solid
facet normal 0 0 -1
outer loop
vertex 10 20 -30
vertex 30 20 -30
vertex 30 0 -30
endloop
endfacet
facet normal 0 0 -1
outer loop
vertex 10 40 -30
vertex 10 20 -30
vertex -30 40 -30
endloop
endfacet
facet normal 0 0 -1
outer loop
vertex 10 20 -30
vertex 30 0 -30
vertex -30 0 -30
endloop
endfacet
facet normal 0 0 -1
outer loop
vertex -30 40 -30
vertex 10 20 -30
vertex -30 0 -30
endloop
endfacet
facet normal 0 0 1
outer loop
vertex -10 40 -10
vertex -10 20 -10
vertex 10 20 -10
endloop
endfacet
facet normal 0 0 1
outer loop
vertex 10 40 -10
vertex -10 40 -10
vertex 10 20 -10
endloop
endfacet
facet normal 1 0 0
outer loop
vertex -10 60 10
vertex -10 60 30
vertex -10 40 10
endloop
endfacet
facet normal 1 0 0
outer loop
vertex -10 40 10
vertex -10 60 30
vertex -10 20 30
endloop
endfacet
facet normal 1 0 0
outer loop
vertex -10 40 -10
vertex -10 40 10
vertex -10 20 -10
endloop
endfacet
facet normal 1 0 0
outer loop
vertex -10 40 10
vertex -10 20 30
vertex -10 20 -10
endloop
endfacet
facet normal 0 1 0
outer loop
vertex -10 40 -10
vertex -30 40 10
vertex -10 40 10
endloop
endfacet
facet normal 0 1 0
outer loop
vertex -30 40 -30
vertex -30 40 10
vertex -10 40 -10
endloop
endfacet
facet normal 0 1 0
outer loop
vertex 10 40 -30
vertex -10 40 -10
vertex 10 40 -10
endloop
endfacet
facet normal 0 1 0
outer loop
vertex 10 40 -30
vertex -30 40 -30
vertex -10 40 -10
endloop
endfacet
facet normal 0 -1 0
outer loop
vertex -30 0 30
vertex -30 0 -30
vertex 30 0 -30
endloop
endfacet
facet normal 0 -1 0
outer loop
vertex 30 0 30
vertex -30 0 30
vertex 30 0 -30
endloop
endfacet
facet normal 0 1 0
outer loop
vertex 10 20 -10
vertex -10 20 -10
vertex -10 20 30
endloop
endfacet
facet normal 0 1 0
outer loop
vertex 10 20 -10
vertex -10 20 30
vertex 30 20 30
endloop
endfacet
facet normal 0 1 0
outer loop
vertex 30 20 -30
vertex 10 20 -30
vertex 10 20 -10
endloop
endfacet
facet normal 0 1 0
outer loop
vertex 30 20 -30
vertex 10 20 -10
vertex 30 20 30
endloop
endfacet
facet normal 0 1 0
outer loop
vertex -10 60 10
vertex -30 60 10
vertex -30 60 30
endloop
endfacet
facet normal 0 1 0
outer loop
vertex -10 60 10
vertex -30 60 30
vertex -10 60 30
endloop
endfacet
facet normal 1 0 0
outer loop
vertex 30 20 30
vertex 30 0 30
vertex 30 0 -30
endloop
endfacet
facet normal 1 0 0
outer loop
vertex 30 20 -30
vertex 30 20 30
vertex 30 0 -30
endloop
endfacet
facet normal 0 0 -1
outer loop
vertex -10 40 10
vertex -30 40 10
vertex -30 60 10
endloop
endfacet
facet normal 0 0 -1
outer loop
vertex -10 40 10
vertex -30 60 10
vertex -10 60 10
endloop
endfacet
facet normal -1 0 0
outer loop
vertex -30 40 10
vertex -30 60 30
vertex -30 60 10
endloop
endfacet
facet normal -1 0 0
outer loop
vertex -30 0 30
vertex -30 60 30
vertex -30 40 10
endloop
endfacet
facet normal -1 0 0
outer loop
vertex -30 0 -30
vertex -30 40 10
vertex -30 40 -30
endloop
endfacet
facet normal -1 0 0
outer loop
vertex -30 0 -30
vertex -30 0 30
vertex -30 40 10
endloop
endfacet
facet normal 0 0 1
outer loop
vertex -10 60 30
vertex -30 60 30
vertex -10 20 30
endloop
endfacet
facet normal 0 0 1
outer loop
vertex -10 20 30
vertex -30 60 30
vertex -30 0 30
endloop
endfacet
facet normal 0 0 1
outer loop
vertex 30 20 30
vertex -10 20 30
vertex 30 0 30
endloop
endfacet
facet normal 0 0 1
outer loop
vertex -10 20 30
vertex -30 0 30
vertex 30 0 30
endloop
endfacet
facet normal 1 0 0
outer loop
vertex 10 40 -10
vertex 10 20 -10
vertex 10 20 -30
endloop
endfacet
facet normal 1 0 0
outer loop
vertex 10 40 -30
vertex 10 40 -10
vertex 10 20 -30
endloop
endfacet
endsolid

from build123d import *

# Parameters (mm, degrees)
CROQUIS1_W              = 60
CROQUIS1_H              = 60
SALIENTE_EXTRUIR1_DEPTH = 20
SALIENTE_EXTRUIR2_DEPTH = 20
CROQUIS3_W              = 20
CROQUIS3_H              = 20
SALIENTE_EXTRUIR3_DEPTH = 20


with BuildPart() as part:
    # Croquis1 → Saliente-Extruir1 (new body)
    with BuildSketch(Plane(origin=(0, 0, 0), x_dir=(1, 0, 0), z_dir=(0, 1, 0))):
        Rectangle(CROQUIS1_W, CROQUIS1_H)
    extrude(amount=SALIENTE_EXTRUIR1_DEPTH)

    # Croquis2 → Saliente-Extruir2 (add)
    with BuildSketch(Plane(origin=(0, 20, 0), x_dir=(1, 0, 0), z_dir=(0, 1, 0))):
        Polygon((-30, -30), (-10, -30), (-10, 10), (10, 10), (10, 30), (-30, 30), align=None)
    extrude(amount=SALIENTE_EXTRUIR2_DEPTH)

    # Croquis3 → Saliente-Extruir3 (add)
    with BuildSketch(Plane(origin=(0, 40, 0), x_dir=(1, 0, 0), z_dir=(0, 1, 0))):
        with Locations((-20, -20)):
            Rectangle(CROQUIS3_W, CROQUIS3_H)
    extrude(amount=SALIENTE_EXTRUIR3_DEPTH)


solid = part.part
